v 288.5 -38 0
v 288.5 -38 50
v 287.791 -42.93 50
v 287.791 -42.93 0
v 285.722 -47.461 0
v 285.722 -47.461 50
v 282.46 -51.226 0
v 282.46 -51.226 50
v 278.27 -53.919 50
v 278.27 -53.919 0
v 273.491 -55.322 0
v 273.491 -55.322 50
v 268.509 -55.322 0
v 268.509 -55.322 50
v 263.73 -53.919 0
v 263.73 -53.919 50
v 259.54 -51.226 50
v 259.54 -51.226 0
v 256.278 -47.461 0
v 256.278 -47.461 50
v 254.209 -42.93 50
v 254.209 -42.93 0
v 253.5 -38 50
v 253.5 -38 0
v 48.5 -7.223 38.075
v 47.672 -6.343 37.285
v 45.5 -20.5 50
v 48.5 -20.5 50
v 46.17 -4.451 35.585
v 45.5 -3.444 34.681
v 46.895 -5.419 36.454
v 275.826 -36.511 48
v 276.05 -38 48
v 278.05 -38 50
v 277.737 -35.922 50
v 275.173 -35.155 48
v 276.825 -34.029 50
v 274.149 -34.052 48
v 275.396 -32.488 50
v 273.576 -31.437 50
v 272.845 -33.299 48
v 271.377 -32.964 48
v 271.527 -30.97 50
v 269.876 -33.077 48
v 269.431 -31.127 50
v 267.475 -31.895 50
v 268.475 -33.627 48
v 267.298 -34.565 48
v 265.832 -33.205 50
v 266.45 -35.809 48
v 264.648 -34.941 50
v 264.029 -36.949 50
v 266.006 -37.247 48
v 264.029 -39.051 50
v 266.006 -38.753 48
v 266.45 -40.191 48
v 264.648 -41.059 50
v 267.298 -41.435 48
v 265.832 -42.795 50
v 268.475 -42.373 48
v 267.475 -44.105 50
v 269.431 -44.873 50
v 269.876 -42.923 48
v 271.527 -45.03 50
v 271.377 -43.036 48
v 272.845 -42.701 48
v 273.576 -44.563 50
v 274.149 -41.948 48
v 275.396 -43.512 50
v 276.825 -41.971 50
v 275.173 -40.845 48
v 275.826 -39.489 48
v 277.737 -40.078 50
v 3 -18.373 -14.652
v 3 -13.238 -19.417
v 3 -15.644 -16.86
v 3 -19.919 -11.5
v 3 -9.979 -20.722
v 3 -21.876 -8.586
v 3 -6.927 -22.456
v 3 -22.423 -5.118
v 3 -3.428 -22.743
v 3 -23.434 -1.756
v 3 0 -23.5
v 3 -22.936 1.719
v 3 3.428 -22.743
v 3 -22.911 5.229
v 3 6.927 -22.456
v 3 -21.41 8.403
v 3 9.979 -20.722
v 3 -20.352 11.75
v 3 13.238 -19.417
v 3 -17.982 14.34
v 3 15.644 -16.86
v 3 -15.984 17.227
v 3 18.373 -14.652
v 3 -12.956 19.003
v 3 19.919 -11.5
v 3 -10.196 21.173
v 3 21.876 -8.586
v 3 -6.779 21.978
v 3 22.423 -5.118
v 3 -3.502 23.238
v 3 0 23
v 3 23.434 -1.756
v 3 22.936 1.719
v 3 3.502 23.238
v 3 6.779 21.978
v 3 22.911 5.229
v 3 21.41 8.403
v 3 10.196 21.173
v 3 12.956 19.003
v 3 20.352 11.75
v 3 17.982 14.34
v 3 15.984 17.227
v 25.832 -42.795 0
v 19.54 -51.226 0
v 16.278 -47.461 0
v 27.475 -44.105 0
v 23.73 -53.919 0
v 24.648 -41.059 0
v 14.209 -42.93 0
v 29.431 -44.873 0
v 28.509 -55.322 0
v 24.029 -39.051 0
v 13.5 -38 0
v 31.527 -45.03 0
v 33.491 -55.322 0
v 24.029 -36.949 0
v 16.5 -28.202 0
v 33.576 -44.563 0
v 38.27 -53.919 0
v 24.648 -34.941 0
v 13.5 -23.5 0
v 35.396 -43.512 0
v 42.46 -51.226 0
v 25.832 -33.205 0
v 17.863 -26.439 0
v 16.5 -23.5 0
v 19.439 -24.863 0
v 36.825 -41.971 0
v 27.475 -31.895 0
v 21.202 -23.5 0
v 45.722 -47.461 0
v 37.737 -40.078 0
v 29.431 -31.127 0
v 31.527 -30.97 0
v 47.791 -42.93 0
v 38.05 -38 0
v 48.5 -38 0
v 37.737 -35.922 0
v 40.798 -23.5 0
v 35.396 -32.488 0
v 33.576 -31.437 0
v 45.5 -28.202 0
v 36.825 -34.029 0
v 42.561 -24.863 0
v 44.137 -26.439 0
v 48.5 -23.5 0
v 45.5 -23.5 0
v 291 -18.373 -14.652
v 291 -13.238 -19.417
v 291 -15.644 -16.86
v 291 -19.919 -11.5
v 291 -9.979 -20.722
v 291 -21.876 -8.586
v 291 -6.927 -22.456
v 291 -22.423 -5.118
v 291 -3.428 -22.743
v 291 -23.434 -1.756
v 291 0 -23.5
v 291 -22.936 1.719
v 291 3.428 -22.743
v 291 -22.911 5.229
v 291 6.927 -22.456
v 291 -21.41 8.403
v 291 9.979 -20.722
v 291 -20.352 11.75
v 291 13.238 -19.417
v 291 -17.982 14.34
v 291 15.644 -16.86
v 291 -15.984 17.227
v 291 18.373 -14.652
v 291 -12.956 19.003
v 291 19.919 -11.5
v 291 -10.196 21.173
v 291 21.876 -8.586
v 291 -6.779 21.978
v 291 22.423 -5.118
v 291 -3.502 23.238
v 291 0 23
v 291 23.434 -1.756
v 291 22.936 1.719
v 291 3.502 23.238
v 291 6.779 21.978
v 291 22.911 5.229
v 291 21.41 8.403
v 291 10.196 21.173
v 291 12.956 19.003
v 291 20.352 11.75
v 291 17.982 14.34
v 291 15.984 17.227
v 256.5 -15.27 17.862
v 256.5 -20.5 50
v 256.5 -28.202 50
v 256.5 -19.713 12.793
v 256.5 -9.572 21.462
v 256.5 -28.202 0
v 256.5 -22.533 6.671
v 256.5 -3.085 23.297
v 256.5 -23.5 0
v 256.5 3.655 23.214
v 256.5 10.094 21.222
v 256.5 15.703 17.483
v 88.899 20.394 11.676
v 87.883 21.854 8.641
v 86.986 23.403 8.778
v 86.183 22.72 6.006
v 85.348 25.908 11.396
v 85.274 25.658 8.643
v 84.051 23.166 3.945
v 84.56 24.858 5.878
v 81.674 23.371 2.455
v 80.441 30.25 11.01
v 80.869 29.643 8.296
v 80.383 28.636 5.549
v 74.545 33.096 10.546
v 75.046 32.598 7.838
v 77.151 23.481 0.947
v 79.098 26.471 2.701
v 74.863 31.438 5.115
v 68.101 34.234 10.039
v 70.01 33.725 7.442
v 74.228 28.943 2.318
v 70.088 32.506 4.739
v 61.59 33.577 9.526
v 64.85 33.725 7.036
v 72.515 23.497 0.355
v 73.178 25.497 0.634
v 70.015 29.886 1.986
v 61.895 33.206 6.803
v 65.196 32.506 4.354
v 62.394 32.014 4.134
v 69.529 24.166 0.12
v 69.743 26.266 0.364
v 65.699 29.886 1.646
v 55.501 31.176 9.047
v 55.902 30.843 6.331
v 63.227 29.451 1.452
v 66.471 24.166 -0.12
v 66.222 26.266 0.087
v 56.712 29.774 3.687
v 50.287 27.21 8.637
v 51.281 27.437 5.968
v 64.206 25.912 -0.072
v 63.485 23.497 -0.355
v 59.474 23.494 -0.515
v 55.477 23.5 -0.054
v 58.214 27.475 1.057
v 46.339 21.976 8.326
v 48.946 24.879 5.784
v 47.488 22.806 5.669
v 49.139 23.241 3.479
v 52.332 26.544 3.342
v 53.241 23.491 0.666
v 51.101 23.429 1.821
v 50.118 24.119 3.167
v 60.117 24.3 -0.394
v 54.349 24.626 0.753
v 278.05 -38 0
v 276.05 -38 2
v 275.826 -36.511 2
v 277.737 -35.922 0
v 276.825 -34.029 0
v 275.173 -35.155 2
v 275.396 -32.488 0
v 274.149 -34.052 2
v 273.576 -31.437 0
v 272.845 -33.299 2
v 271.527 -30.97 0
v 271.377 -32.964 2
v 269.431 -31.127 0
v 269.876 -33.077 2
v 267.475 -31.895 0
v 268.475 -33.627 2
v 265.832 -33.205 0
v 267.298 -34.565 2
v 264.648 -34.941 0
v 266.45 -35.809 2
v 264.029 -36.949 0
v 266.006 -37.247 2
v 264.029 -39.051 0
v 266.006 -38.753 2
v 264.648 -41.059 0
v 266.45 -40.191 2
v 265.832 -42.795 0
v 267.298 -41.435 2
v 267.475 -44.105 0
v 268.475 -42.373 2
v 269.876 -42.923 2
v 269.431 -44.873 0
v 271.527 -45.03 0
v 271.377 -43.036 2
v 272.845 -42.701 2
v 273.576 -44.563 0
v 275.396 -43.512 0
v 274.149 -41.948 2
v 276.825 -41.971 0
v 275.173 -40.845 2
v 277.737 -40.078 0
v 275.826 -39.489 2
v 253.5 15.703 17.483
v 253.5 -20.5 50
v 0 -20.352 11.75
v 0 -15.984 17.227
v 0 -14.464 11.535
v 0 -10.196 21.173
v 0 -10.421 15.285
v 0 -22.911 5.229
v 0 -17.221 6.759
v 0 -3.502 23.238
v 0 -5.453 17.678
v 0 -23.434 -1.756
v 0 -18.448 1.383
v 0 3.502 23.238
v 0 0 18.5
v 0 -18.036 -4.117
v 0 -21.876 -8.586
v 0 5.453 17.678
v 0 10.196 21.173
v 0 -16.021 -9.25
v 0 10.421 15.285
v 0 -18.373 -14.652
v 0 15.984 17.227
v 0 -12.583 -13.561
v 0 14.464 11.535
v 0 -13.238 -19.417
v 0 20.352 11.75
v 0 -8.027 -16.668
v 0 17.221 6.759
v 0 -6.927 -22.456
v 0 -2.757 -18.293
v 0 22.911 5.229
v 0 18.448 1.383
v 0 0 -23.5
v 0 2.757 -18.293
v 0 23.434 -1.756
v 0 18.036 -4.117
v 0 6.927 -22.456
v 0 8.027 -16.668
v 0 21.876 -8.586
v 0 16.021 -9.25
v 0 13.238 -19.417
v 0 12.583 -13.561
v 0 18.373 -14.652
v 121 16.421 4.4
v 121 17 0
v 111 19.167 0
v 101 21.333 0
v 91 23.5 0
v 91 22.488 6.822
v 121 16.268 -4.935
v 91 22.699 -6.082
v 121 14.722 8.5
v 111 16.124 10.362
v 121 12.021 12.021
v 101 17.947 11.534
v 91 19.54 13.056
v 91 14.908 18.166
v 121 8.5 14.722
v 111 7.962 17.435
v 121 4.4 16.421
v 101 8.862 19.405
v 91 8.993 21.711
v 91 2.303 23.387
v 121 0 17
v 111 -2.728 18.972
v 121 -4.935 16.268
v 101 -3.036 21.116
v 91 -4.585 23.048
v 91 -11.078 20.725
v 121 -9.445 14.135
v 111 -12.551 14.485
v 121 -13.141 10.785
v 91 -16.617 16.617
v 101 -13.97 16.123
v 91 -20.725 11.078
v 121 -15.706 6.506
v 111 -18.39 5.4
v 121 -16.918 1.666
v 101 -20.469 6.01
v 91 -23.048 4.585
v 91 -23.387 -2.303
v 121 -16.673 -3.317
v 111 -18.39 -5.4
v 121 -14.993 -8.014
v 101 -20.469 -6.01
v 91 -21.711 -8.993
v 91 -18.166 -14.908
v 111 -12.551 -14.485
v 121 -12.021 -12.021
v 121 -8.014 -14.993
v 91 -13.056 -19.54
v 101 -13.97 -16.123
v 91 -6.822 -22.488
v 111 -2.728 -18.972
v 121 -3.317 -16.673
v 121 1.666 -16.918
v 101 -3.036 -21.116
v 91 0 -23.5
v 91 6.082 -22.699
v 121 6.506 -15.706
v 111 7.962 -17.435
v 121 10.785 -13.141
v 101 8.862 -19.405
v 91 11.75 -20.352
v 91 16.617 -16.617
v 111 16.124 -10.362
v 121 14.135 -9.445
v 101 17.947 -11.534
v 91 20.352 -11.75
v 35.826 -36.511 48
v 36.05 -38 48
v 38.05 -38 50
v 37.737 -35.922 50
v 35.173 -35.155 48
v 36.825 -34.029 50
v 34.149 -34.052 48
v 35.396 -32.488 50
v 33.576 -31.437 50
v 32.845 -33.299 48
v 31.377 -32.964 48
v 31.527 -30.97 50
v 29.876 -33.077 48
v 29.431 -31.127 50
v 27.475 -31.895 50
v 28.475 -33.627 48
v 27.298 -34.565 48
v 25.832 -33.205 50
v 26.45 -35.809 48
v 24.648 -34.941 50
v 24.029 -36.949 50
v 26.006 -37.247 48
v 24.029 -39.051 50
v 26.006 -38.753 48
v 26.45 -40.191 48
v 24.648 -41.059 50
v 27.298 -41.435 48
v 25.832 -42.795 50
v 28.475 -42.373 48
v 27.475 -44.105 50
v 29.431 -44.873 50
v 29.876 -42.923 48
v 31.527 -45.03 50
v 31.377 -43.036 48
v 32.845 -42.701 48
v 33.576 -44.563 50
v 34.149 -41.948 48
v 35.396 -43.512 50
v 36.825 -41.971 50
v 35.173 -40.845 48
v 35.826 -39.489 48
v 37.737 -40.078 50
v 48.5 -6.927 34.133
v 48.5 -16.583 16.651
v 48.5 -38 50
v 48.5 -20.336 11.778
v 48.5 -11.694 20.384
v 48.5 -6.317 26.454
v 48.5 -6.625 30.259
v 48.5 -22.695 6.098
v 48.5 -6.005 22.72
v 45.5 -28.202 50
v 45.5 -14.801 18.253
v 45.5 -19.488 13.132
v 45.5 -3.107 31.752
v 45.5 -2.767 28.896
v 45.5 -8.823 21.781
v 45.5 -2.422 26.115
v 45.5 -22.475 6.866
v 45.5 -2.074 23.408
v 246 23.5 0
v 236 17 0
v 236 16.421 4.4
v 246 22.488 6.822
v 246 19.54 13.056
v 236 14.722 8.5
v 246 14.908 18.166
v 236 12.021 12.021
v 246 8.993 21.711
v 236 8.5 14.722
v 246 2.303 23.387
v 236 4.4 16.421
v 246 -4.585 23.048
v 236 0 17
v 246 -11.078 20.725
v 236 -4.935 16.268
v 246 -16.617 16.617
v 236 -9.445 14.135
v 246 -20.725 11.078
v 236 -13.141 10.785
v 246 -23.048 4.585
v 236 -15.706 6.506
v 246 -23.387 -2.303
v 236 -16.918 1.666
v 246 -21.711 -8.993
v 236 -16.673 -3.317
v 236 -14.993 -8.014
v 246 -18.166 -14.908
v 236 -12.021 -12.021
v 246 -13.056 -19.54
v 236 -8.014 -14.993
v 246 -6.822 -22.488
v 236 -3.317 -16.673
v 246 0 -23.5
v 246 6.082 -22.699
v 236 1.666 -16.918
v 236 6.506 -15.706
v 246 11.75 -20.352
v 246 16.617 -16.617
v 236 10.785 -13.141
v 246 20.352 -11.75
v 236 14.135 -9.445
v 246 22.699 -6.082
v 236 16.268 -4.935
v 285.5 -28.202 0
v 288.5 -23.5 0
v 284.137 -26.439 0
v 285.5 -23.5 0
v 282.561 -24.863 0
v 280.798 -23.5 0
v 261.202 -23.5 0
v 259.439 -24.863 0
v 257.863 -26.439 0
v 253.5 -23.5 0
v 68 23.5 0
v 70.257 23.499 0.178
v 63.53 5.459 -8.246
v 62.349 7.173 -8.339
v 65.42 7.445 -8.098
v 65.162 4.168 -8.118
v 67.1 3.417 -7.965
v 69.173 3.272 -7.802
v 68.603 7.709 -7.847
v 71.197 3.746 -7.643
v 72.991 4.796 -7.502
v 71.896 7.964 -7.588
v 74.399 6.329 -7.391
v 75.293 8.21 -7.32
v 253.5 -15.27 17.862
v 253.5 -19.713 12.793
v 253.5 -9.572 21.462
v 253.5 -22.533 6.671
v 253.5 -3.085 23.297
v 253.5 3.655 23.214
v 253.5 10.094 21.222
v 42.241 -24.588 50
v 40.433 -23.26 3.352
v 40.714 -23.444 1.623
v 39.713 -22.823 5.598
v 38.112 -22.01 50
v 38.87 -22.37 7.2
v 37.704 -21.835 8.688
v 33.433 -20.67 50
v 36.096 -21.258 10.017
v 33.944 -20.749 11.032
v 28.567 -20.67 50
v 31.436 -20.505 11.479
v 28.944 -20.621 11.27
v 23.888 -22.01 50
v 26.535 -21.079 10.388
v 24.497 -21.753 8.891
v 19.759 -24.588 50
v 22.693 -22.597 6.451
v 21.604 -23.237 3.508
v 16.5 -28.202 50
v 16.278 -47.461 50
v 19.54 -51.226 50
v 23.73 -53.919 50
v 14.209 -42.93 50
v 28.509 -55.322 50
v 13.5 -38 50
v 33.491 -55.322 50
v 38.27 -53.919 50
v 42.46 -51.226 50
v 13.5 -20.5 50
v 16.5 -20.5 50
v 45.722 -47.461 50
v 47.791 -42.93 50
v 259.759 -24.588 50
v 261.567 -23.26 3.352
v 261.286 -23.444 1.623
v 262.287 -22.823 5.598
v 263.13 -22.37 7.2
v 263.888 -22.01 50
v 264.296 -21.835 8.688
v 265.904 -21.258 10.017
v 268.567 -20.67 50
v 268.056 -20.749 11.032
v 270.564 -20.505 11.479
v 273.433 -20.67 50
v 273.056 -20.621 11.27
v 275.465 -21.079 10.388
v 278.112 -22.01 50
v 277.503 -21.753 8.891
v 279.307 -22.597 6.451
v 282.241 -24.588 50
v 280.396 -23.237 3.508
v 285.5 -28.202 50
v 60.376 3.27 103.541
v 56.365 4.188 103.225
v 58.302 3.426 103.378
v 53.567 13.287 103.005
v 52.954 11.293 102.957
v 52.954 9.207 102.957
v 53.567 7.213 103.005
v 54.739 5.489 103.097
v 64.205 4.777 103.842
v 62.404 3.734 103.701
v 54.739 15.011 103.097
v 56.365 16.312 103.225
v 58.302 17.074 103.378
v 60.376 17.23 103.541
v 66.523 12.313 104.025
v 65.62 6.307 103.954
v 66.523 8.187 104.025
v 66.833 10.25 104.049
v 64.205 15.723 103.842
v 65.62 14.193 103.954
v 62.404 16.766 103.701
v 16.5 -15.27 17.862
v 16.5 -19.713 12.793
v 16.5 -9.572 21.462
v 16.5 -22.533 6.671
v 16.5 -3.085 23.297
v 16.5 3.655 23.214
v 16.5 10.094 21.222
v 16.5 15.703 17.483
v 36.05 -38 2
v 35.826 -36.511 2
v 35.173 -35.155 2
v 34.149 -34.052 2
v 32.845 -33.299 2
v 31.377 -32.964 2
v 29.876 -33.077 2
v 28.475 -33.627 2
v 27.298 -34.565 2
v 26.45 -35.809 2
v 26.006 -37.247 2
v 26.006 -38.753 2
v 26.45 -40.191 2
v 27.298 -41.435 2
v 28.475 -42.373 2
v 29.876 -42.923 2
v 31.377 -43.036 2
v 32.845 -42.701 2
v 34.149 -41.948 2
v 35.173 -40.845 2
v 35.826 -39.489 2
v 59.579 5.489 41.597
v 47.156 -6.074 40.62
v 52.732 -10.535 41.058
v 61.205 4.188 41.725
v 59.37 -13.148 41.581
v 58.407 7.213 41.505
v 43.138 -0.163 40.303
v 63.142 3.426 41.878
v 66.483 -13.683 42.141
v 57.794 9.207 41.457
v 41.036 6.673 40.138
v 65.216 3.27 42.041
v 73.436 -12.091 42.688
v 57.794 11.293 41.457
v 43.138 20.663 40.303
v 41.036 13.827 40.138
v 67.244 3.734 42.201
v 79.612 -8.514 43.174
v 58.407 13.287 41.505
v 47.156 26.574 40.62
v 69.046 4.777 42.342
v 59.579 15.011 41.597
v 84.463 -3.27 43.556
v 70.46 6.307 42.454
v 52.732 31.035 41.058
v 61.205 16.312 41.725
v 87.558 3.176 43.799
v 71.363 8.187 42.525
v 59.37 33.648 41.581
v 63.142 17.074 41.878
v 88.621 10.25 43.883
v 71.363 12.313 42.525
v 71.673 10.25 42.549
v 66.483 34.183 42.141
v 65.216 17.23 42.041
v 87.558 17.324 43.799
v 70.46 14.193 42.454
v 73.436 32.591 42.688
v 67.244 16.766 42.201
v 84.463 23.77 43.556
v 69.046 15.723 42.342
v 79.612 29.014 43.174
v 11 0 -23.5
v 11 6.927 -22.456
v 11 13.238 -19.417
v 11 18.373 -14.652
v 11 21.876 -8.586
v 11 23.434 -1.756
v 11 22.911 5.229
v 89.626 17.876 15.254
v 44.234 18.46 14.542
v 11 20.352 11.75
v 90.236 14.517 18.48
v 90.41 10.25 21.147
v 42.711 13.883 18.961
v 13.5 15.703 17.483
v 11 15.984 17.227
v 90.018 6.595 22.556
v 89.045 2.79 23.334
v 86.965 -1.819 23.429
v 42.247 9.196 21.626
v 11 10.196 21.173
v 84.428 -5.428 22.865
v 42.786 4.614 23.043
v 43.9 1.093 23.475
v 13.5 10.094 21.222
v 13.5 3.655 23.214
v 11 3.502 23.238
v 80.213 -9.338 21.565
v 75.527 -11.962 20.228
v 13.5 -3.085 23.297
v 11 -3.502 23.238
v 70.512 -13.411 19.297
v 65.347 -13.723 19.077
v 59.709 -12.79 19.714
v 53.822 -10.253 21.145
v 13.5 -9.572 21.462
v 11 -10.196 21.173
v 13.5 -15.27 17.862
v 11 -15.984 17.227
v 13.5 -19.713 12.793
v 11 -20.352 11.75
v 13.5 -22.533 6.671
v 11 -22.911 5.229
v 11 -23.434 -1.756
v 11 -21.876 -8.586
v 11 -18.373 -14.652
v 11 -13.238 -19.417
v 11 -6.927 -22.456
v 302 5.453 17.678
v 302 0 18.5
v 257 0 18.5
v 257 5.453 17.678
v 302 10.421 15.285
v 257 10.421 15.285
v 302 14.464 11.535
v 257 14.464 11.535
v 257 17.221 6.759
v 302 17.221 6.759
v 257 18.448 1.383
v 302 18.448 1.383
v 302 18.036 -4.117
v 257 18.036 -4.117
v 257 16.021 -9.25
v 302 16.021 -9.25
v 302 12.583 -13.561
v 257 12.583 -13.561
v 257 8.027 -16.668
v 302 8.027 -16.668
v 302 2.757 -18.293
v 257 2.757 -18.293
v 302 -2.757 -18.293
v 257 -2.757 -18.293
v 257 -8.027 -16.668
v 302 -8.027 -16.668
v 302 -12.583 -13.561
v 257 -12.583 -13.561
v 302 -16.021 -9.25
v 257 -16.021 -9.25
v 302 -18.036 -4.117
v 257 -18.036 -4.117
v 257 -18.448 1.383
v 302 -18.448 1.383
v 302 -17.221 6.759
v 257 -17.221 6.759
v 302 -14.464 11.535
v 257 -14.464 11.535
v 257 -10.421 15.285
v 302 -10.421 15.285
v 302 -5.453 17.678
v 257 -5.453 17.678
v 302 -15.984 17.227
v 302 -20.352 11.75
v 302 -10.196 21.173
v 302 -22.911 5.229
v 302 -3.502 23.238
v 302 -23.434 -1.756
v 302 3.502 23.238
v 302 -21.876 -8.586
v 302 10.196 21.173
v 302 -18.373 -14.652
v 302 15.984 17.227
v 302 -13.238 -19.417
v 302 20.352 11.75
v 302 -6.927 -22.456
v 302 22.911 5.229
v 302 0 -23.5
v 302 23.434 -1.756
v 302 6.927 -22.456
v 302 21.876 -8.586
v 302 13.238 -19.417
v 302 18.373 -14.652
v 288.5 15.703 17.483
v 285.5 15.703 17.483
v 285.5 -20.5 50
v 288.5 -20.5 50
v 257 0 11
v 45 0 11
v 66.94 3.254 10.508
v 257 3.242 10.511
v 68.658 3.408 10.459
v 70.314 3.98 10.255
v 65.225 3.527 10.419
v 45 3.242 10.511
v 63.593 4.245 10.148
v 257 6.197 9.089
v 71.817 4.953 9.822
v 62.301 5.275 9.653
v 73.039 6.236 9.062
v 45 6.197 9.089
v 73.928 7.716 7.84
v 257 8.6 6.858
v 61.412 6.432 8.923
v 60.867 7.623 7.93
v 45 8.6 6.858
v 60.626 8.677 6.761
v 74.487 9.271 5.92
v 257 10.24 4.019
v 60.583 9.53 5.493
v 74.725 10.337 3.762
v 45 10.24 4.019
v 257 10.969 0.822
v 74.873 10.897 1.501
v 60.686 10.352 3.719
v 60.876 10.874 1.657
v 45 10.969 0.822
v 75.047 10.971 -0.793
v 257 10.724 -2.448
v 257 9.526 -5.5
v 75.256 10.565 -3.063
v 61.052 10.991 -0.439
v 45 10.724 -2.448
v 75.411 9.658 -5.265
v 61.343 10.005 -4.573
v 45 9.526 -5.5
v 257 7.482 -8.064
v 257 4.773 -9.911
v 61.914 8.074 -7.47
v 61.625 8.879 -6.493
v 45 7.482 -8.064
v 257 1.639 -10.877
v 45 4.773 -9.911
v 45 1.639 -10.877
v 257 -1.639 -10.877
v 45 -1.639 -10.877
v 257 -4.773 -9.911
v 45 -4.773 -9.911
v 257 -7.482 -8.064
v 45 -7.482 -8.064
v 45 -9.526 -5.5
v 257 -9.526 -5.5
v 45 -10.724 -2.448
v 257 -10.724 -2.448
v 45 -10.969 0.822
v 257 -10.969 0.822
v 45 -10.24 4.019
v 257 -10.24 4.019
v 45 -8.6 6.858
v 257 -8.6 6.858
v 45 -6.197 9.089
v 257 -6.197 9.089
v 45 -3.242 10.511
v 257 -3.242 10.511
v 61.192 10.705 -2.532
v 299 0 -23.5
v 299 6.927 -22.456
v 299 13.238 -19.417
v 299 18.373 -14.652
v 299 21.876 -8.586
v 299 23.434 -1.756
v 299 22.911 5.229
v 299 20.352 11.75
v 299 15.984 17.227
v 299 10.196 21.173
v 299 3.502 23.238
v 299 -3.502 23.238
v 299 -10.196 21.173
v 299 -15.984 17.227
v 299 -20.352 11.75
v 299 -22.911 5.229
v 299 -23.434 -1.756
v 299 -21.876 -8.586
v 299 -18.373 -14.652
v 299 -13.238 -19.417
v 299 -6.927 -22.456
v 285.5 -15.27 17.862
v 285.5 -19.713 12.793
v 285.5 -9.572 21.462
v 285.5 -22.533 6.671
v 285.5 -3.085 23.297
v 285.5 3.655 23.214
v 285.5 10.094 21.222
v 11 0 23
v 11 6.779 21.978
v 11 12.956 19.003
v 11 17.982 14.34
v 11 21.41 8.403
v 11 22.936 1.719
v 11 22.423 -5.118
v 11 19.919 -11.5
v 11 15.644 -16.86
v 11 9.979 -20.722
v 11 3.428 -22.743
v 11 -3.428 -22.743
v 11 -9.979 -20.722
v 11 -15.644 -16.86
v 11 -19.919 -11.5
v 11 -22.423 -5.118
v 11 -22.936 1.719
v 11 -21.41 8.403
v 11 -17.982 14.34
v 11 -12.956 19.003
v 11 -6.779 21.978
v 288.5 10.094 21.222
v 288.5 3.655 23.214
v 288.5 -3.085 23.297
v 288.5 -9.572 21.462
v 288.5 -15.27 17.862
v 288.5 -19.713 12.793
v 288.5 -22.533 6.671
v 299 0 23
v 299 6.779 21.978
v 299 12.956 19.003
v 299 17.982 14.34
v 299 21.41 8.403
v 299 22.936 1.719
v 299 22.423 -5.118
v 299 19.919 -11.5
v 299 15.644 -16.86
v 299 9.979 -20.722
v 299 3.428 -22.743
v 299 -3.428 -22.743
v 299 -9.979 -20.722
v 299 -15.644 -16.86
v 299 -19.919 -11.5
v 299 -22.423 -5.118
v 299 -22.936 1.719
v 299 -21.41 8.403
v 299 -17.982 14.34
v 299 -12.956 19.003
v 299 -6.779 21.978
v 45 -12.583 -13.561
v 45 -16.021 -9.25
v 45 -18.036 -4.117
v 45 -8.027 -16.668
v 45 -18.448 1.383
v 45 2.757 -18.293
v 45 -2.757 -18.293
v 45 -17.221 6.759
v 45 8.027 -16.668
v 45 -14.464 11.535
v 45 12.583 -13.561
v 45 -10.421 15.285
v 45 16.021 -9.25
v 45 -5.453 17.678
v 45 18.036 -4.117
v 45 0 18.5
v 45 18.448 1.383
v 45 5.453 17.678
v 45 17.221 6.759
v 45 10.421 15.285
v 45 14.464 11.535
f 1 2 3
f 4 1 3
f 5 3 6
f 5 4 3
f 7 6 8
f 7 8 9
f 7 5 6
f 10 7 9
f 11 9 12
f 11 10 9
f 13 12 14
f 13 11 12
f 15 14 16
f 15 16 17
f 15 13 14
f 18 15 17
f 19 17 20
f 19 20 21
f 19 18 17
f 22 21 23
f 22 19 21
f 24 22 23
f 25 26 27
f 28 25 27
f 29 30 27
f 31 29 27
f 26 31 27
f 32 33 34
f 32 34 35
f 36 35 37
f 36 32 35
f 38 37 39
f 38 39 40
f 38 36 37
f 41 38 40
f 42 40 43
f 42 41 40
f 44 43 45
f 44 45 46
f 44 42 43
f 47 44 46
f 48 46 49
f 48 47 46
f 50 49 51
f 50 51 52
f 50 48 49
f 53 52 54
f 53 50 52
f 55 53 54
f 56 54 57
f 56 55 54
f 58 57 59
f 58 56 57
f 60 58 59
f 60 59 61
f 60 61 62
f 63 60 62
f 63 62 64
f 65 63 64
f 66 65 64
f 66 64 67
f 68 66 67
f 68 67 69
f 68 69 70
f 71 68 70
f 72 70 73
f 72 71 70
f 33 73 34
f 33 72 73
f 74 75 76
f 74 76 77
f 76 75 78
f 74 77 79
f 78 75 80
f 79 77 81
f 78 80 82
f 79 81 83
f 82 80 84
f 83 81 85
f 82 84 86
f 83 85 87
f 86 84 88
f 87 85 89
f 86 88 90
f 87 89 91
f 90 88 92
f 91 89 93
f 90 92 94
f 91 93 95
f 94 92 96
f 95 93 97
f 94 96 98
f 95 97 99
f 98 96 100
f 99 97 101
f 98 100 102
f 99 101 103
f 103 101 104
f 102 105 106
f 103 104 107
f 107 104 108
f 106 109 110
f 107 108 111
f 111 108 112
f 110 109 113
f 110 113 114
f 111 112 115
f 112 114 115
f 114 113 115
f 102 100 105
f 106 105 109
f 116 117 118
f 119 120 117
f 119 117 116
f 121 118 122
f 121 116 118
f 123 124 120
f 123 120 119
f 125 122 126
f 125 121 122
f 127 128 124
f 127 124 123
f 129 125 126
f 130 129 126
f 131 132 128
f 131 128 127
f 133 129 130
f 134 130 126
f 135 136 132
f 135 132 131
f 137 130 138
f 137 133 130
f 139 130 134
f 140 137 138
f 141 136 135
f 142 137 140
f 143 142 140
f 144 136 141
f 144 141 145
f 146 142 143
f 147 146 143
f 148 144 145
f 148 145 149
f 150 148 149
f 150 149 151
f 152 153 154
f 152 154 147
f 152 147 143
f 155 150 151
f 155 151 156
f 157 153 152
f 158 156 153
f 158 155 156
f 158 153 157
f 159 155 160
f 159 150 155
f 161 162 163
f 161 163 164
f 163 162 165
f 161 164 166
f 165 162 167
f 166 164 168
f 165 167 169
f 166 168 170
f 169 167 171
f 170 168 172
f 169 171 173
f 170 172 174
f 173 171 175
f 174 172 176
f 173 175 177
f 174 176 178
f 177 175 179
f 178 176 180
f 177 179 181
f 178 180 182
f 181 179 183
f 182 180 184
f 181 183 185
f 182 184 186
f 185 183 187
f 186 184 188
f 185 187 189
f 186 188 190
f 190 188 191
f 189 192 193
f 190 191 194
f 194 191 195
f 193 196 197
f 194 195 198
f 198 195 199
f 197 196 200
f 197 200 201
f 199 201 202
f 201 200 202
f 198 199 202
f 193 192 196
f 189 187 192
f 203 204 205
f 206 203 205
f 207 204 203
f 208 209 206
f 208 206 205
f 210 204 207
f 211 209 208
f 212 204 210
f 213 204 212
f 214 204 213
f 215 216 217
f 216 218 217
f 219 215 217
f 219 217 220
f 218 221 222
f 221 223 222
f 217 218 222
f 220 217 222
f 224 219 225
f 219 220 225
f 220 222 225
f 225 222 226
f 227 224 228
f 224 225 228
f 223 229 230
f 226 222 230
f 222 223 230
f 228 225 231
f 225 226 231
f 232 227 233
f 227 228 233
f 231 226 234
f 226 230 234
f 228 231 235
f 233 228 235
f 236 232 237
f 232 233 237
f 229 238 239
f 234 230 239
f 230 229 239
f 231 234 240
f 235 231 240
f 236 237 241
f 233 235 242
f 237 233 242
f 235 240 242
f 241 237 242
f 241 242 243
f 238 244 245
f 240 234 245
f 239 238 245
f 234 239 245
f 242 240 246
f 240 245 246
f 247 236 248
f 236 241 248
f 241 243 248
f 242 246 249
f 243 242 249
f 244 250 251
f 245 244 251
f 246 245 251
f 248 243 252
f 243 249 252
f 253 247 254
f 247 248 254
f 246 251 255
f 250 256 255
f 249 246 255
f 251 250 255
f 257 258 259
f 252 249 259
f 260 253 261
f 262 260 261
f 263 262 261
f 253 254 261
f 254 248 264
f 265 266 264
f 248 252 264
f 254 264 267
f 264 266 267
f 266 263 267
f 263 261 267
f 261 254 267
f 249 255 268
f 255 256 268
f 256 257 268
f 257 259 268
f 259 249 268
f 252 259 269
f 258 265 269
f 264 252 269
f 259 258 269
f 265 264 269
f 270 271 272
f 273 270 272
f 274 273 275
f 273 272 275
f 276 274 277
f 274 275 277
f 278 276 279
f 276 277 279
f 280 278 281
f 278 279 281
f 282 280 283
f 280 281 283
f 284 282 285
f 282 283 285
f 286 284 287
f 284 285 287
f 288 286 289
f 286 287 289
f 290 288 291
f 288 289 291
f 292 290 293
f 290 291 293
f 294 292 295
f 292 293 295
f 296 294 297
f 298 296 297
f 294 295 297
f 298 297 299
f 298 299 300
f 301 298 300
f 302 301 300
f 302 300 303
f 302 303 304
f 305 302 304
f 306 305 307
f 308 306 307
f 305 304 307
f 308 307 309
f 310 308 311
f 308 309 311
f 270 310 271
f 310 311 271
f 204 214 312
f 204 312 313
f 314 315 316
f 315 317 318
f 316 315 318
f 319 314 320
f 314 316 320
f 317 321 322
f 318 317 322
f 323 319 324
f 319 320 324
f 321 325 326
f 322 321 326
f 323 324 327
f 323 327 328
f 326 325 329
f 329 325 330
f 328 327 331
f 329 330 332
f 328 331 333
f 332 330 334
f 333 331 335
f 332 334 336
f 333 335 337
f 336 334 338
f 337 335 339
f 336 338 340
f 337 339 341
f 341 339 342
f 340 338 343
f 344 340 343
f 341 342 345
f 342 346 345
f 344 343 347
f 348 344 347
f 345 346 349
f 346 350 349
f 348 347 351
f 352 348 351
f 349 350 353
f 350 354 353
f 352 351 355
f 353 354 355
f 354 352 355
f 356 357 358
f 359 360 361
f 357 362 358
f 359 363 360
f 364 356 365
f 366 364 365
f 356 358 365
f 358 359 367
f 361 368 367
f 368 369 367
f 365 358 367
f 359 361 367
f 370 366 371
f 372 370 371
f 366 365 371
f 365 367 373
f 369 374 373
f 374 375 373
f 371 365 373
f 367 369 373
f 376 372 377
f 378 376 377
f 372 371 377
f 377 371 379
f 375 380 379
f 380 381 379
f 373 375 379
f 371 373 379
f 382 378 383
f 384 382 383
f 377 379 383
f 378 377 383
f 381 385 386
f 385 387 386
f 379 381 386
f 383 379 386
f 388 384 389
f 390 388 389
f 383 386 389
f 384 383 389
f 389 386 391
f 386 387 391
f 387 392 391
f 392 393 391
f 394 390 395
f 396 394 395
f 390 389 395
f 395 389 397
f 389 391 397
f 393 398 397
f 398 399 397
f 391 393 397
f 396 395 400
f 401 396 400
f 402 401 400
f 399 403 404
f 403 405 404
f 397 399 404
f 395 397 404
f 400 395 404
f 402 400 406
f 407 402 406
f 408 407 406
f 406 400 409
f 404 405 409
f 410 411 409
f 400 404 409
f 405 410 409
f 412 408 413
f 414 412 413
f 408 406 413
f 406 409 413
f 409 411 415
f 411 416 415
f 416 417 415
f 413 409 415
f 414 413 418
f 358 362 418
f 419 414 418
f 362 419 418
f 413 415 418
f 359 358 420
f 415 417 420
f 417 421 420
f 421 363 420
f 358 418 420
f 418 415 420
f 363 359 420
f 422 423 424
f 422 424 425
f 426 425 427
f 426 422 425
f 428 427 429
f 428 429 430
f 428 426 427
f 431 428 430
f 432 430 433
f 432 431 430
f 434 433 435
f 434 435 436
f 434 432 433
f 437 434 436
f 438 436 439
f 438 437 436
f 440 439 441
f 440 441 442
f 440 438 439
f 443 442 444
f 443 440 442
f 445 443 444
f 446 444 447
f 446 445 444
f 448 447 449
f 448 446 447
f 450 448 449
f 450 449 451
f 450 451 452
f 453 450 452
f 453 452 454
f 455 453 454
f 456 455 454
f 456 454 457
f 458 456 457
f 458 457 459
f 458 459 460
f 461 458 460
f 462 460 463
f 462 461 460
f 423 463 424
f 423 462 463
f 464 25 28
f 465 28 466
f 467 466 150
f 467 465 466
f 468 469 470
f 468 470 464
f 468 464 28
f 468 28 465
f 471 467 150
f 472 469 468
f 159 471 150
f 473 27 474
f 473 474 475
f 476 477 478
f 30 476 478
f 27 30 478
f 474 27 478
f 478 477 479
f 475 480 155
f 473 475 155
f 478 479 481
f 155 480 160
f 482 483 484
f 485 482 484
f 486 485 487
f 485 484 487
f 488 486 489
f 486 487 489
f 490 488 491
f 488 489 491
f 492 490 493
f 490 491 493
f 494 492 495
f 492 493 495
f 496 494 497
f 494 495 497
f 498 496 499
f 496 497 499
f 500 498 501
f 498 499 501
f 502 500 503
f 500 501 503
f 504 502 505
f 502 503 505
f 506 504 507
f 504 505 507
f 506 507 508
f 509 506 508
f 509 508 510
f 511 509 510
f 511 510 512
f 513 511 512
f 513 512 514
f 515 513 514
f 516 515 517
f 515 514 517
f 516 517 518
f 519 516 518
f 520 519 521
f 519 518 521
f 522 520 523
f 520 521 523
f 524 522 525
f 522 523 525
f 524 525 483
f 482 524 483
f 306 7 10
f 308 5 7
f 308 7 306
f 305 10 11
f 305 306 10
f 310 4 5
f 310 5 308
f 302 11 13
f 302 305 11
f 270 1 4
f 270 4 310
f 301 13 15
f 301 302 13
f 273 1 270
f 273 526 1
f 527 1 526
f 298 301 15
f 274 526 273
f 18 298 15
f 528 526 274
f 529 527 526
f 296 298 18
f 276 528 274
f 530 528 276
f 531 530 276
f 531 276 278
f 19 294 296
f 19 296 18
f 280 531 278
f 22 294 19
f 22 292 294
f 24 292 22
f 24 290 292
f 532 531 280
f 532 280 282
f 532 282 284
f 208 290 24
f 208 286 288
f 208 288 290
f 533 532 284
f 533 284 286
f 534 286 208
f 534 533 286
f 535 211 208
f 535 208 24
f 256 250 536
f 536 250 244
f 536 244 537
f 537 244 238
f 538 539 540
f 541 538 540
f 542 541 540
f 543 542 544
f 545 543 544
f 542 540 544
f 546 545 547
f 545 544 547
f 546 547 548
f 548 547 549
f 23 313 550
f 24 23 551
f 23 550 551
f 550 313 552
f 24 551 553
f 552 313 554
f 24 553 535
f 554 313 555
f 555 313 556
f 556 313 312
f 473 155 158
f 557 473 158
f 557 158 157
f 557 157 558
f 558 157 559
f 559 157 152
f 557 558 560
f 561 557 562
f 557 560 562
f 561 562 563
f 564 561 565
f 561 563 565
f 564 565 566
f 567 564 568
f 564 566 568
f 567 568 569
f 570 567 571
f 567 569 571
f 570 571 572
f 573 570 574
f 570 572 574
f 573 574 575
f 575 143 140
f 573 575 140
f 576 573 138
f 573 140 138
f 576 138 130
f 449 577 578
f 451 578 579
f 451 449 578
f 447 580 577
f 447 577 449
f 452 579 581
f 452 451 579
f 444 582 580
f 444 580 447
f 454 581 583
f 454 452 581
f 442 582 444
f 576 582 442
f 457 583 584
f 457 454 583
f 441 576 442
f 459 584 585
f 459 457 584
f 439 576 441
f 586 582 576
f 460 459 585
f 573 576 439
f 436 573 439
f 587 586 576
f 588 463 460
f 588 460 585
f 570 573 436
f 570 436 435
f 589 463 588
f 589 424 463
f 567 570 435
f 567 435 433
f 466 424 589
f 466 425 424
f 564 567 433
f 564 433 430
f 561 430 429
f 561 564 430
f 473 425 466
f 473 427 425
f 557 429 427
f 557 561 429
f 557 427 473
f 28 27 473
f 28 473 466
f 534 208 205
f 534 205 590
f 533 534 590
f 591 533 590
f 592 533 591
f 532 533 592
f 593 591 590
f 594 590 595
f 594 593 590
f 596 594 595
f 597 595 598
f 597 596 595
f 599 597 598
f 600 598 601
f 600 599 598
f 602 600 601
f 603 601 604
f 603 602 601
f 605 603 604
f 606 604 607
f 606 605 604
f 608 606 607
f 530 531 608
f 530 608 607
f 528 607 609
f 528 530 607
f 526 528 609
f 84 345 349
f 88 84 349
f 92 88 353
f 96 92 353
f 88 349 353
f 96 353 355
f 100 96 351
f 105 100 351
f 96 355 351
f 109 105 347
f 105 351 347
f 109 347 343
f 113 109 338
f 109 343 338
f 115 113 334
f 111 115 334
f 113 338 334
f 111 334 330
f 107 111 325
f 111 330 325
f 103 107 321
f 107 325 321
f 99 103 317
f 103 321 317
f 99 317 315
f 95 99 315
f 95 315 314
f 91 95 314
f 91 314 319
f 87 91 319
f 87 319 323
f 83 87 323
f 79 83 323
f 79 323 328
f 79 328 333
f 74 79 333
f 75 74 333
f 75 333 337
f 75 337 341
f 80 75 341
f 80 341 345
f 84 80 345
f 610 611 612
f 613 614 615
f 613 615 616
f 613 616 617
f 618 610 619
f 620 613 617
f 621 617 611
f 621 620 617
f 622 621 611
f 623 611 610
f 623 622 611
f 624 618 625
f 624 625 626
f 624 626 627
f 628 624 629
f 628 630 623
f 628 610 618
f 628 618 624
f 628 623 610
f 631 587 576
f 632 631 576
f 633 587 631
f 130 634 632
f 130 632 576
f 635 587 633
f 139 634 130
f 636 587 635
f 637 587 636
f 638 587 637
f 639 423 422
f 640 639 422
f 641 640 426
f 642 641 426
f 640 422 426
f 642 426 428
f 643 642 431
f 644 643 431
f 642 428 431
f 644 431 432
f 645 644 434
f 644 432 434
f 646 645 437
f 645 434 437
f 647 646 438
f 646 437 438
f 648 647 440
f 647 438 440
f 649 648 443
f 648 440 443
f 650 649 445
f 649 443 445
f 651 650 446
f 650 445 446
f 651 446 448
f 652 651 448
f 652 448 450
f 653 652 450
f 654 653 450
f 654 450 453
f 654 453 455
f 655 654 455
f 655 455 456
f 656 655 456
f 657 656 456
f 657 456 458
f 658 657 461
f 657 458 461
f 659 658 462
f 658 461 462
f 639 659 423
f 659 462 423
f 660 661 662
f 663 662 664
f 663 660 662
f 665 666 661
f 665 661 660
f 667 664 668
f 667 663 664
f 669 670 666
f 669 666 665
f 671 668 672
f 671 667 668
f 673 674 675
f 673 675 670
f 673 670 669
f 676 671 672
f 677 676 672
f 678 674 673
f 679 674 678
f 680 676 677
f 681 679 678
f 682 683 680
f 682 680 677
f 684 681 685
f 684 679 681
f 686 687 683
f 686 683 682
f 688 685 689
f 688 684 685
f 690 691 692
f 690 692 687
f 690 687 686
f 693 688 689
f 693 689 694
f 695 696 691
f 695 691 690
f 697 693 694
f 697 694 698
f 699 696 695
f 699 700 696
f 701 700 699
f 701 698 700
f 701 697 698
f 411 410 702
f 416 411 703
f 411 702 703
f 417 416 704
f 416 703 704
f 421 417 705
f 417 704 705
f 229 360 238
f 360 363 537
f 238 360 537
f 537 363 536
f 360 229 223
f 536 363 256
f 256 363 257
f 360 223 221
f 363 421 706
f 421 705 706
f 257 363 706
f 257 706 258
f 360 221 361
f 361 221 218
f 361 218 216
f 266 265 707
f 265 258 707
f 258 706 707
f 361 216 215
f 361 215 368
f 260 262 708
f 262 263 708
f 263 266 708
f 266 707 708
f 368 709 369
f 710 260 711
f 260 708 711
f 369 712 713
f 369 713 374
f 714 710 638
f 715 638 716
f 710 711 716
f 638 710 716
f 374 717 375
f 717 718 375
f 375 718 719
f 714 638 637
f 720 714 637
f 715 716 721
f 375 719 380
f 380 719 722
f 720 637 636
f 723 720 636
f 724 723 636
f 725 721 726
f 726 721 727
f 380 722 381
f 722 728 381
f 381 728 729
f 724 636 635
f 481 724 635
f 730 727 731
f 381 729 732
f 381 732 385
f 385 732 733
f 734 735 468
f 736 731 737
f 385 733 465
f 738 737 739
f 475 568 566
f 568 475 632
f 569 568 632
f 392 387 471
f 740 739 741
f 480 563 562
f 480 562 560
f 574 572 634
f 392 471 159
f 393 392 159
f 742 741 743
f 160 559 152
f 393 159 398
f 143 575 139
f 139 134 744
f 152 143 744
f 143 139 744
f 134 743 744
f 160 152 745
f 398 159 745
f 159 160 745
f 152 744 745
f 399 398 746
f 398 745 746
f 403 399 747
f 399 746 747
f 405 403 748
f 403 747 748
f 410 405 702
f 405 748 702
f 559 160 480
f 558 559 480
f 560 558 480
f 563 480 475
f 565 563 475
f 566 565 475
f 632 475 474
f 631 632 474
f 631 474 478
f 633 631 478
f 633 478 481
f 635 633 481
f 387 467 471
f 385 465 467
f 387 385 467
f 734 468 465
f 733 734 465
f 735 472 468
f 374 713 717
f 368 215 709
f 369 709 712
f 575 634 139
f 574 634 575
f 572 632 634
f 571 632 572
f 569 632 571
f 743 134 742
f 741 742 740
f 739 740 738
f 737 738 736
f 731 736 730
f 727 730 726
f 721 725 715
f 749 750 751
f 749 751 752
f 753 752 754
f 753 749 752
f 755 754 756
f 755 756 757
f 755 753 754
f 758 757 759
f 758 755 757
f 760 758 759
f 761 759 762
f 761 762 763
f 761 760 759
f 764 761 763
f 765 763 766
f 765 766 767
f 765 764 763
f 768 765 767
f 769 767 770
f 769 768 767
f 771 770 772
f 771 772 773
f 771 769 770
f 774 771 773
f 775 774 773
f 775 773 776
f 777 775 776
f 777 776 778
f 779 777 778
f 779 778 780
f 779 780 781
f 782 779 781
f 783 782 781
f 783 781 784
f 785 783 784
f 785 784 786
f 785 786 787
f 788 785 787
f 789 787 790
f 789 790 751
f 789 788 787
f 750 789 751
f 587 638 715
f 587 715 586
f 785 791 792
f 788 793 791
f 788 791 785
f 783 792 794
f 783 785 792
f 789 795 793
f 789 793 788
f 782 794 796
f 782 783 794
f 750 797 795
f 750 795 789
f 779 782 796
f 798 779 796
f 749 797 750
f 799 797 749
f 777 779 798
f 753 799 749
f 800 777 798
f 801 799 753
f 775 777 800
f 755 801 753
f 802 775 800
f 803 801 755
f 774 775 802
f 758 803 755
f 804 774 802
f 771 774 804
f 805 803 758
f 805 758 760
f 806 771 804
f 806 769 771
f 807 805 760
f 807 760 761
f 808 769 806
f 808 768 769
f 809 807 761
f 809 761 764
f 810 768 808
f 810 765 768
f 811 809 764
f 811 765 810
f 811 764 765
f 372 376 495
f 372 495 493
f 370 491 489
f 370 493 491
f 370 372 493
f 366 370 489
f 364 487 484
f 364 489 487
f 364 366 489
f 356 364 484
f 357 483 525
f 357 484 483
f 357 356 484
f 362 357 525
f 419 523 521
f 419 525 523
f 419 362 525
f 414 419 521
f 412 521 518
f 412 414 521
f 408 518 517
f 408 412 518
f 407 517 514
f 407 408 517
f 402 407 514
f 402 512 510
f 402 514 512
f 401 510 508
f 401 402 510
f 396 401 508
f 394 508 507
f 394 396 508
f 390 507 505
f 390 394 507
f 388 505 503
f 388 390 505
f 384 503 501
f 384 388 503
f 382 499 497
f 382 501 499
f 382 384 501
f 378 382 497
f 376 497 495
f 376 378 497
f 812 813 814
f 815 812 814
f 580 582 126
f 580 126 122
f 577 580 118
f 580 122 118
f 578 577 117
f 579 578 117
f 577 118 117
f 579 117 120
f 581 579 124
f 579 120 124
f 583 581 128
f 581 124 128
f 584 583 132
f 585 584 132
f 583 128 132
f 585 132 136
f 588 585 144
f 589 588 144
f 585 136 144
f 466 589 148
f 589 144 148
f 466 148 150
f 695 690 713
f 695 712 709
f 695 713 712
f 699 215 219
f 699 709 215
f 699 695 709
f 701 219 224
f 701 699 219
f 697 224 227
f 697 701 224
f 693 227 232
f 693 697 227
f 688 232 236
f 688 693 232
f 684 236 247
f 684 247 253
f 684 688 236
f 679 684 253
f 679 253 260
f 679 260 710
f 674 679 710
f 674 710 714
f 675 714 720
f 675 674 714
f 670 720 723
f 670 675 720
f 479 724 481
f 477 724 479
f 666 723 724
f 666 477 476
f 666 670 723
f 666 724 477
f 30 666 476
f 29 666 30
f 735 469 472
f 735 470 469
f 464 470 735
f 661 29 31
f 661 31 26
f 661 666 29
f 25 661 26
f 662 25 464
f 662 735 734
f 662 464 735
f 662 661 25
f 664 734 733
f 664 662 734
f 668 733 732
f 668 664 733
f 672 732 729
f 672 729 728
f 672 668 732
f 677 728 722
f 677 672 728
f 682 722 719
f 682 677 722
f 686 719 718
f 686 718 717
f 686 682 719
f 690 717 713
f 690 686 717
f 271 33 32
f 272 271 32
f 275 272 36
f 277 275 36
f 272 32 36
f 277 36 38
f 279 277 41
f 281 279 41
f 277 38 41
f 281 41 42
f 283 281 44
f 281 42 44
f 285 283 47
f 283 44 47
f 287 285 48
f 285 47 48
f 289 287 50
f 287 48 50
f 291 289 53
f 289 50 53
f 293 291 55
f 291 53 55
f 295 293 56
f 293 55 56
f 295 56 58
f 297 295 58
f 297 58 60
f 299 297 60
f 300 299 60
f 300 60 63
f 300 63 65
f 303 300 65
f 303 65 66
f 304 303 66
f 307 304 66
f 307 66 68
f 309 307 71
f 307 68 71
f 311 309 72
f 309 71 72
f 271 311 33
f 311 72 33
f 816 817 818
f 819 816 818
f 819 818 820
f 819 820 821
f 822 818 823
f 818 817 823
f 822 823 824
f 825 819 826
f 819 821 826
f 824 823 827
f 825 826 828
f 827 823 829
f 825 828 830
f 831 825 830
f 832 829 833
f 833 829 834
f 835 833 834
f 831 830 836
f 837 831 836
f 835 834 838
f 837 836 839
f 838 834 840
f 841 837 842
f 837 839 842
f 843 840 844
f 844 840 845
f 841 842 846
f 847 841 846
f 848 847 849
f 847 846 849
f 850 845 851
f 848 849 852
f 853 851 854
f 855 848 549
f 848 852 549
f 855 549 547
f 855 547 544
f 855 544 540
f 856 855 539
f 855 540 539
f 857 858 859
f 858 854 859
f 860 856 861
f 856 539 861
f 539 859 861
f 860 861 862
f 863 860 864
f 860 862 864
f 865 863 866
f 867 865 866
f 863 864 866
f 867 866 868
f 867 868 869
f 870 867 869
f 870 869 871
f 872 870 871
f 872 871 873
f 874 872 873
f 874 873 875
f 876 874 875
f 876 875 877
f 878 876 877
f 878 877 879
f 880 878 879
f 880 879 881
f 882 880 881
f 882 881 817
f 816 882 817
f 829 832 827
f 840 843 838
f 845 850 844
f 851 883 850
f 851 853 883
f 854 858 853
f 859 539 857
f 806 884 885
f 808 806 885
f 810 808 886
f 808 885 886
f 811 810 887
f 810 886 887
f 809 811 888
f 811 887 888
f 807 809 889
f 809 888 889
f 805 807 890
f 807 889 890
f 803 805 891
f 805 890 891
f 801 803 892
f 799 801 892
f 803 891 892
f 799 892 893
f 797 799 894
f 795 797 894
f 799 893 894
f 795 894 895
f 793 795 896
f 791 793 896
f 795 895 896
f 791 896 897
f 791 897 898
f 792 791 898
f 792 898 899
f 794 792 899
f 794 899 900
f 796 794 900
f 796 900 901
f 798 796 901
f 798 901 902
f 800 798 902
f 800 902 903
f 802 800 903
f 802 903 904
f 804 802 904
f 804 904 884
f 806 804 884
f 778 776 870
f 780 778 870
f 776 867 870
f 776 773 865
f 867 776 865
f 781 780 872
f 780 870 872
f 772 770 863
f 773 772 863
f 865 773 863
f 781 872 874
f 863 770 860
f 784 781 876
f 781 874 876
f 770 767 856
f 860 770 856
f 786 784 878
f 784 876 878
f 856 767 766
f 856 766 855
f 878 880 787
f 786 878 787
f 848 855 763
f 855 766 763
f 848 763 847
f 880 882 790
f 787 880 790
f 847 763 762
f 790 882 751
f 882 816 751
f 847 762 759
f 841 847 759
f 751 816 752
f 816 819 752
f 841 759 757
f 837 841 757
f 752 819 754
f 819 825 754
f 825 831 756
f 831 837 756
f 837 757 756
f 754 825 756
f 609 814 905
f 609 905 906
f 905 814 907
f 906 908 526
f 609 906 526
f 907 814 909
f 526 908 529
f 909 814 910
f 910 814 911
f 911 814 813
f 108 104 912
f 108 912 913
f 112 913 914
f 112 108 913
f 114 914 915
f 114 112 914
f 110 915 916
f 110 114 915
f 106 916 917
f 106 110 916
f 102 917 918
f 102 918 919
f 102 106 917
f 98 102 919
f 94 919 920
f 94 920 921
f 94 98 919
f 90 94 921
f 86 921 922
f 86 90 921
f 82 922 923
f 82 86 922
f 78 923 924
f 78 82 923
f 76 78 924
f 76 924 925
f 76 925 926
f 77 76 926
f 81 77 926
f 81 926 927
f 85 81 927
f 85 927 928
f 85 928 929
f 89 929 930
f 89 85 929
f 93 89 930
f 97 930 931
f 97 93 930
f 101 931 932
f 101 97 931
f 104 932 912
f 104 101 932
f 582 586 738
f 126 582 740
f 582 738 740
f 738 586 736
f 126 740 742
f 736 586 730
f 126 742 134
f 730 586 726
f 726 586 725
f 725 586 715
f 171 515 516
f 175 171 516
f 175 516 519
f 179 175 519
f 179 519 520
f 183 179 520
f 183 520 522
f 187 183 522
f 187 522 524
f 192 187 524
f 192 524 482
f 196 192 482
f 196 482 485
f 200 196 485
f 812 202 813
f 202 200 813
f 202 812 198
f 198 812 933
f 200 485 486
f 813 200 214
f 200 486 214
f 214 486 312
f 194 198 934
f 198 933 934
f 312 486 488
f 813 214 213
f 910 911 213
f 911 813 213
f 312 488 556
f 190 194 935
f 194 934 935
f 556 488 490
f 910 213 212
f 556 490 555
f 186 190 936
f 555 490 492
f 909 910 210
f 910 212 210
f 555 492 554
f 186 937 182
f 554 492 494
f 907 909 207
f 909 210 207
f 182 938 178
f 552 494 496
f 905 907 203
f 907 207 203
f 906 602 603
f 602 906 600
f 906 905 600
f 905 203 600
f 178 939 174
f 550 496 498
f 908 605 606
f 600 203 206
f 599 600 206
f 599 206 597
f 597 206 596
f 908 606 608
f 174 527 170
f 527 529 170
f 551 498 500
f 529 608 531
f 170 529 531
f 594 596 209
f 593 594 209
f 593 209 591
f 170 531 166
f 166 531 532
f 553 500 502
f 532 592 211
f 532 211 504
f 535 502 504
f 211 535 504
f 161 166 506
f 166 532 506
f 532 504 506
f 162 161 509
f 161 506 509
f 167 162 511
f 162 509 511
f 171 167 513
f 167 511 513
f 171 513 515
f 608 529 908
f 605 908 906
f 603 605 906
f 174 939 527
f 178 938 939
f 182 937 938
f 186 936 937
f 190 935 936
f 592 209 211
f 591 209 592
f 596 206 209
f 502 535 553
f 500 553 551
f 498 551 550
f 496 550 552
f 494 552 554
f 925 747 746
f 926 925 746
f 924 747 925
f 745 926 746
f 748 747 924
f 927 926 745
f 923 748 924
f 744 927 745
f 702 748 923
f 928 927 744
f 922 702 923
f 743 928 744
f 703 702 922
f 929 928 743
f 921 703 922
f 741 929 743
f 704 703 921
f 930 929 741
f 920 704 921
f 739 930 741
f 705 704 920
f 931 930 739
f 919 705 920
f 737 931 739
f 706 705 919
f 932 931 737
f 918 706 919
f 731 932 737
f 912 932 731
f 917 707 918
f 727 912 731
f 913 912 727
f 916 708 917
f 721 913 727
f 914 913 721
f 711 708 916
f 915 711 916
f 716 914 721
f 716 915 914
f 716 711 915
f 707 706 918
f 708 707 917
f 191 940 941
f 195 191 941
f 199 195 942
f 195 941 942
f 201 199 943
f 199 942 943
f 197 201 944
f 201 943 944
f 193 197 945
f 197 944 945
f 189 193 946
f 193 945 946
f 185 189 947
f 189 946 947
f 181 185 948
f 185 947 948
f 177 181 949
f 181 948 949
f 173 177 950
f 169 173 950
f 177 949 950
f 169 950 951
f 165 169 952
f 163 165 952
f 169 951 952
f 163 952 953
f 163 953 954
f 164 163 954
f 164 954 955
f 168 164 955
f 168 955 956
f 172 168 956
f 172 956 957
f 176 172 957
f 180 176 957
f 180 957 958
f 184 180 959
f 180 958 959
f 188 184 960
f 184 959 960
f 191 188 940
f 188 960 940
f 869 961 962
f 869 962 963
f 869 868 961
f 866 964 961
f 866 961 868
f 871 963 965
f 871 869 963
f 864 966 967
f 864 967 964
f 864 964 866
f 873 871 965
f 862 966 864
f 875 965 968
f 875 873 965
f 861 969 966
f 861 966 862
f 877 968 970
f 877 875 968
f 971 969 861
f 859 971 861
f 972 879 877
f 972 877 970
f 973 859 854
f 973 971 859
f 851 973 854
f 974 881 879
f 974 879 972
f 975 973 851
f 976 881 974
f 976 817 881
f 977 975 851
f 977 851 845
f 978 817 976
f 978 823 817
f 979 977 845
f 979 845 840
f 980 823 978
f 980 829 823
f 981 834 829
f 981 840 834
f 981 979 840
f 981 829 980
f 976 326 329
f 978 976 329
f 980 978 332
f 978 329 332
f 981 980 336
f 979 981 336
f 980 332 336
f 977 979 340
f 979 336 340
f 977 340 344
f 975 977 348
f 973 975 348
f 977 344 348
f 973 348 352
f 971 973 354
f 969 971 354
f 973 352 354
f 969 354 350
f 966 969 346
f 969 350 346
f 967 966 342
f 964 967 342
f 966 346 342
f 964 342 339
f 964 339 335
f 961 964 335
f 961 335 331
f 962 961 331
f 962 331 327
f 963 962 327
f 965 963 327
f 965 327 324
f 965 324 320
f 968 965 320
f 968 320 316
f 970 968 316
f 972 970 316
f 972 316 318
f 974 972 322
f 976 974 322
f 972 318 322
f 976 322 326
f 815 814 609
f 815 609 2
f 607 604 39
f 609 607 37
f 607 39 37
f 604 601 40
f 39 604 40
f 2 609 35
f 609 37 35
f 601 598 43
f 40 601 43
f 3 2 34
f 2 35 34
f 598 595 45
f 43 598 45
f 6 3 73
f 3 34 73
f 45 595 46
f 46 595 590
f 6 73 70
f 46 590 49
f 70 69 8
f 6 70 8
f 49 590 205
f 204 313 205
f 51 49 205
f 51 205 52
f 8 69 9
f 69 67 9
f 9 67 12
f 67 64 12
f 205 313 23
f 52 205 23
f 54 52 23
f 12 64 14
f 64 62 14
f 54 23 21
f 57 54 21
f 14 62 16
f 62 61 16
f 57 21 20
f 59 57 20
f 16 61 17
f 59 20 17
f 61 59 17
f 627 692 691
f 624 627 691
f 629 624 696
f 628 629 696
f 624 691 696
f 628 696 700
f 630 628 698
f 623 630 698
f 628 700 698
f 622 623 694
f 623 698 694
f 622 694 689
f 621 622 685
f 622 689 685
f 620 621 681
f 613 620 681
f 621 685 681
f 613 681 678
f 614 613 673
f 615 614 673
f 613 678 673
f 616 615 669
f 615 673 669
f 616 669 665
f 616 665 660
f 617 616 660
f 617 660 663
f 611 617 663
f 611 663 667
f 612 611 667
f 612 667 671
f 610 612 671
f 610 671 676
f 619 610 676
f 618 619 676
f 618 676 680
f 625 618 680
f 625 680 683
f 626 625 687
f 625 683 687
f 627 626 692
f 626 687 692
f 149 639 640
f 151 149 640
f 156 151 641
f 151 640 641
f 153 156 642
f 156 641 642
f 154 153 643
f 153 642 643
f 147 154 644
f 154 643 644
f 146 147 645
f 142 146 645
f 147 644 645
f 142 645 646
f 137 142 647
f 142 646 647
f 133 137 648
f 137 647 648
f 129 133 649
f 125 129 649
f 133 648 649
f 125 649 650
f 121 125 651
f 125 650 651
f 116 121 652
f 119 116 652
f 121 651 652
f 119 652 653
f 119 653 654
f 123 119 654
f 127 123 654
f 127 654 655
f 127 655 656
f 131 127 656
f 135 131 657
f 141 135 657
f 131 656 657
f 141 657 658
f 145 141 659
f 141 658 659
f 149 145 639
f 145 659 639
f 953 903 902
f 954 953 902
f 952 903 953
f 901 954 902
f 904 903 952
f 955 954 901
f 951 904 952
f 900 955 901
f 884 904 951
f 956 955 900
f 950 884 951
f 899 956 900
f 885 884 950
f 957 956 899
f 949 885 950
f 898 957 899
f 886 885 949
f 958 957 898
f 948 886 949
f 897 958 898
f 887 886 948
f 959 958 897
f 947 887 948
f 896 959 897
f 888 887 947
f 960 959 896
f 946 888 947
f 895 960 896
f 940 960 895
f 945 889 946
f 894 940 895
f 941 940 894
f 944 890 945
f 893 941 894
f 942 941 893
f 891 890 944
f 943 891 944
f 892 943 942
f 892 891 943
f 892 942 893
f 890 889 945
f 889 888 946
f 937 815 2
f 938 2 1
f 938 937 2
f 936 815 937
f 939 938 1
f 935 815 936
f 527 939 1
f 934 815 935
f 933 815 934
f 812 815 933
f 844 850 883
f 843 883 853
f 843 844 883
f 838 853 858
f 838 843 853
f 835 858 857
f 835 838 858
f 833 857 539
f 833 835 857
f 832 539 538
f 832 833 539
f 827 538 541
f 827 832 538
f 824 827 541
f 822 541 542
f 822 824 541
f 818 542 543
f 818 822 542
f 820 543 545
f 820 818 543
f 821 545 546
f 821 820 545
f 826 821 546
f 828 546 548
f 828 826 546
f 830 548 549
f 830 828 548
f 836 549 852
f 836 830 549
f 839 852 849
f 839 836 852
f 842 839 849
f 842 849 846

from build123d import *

# Parameters (mm, degrees)
SZKIC1_R                        = 23.5
DODANIE_WYCI_GNI_CIE1_DEPTH     = 302
SZKIC2_R                        = 17.5
DODANIE_WYCI_GNI_CIE2_DEPTH     = 50
SZKIC4_R                        = 17.5
DODANIE_WYCI_GNI_CIE3_DEPTH     = 50
SZKIC5_R                        = 5.05
WYTNIJ_WYCI_GNI_CIE1_DEPTH      = 50
SFAZOWANIE1_SIZE                = 2
SZKIC8_R                        = 24
DODANIE_WYCI_GNI_CIE4_DEPTH     = 42.129872
SZKIC12_R                       = 7
DODANIE_WYCI_GNI_CIE5_DEPTH     = 61.69017
SZKIC6_R                        = 11
WYTNIJ_WYCI_GNI_CIE2_DEPTH      = 302
SZKIC13_R                       = 7
DODANIE_WYCI_GNI_CIE6_DEPTH     = 50
DODANIE_WYCI_GNI_CIE7_START     = 14.5
DODANIE_WYCI_GNI_CIE7_DEPTH     = 3
ZAOKR_GLENIE1_R                 = 10
LUSTRO2_START                   = 14.5
LUSTRO2_COPY_1_DEPTH            = 3
WYTNIJ_WYCI_GNI_CIE3_START      = -3
SZKIC17_R                       = 23.5
SZKIC17_R_2                     = 23
WYTNIJ_WYCI_GNI_CIE3_DEPTH      = 8
SZKIC18_R                       = 23.5
SZKIC18_R_2                     = 17
WYTNIJ_WYCI_GNI_CIE4_DEPTH      = 60
WYTNIJ_WYCI_GNI_CIE4_DEPTH_BACK = 95
SZKIC20_R                       = 18.5
WYTNIJ_WYCI_GNI_CIE5_DEPTH      = 45


with BuildPart() as part:
    # Szkic1 → Dodanie-wyciągnięcie1 (new body)
    with BuildSketch(Plane(origin=(0, 0, 0), x_dir=(0, 0, -1), z_dir=(1, 0, 0))):
        Circle(SZKIC1_R)
    extrude(amount=DODANIE_WYCI_GNI_CIE1_DEPTH)

    # Szkic2 → Dodanie-wyciągnięcie2 (add)
    with BuildSketch(Plane.XY):
        with Locations((31, -38)):
            Circle(SZKIC2_R)
    extrude(amount=DODANIE_WYCI_GNI_CIE2_DEPTH)

    # Szkic4 → Dodanie-wyciągnięcie3 (add)
    with BuildSketch(Plane(origin=(0, 0, 0), x_dir=(-1, 0, 0), z_dir=(0, 0, -1))):
        with Locations((-271, -38)):
            Circle(SZKIC4_R)
    extrude(amount=-DODANIE_WYCI_GNI_CIE3_DEPTH)

    # Szkic5 → Wytnij-wyciągnięcie1 (cut)
    with BuildSketch(Plane.XY.offset(50)):
        with Locations((31, -38)):
            Circle(SZKIC5_R)
        with Locations((271, -38)):
            Circle(SZKIC5_R)
    extrude(amount=-WYTNIJ_WYCI_GNI_CIE1_DEPTH, mode=Mode.SUBTRACT)

    # Sfazowanie1
    sfazowanie1_edges = [part.edges().sort_by_distance(p)[0] for p in [
        (25.95, -38, 0),
        (25.95, -38, 50),
        (265.95, -38, 0),
        (265.95, -38, 50),
    ]]
    chamfer(sfazowanie1_edges, length=SFAZOWANIE1_SIZE)

    # Szkic8 → Dodanie-wyciągnięcie4 (add)
    with BuildSketch(Plane(origin=(64.694528313, 23.5, 42), x_dir=(0.996917334, 0, 0.078459096), z_dir=(-0.078459096, 0, 0.996917334))):
        with Locations((0, -13.25)):
            Circle(SZKIC8_R)
    extrude(amount=-DODANIE_WYCI_GNI_CIE4_DEPTH)

    # Szkic12 → Dodanie-wyciągnięcie5 (add)
    with BuildSketch(Plane(origin=(-2.886875267, 0, 36.681228189), x_dir=(0.996917334, 0, 0.078459096), z_dir=(-0.078459096, 0, 0.996917334))):
        with Locations((67.790378694, 10.25)):
            Circle(SZKIC12_R)
    extrude(amount=DODANIE_WYCI_GNI_CIE5_DEPTH)

    # Szkic6 → Wytnij-wyciągnięcie2 (cut)
    with BuildSketch(Plane.ZY):
        Circle(SZKIC6_R)
    extrude(amount=-WYTNIJ_WYCI_GNI_CIE2_DEPTH, mode=Mode.SUBTRACT)

    # Szkic13 → Dodanie-wyciągnięcie6 (add)
    with BuildSketch(Plane(origin=(64.694528313, 23.5, 42), x_dir=(0.996917334, 0, 0.078459096), z_dir=(-0.078459096, 0, 0.996917334))):
        with Locations((0, -13.25)):
            Circle(SZKIC13_R)
    extrude(amount=-DODANIE_WYCI_GNI_CIE6_DEPTH)

    # Szkic16 → Dodanie-wyciągnięcie7 (add)
    with BuildSketch(Plane.ZY.offset(-31).offset(DODANIE_WYCI_GNI_CIE7_START)):
        Polygon((50, -38), (0, -38), (0, -20.172556468), (13.849344331, -17.060101722), (21.580694053, -1.91951259), (17.483252048, 15.703053774), (50, -20.5), align=None)
    dodanie_wyci_gni_cie7 = extrude(amount=DODANIE_WYCI_GNI_CIE7_DEPTH)

    # Zaokrąglenie1
    zaokr_glenie1_edges = [part.edges().sort_by_distance(p)[0] for p in [
        (68.000000001, 34.25, 3.37e-07),
    ]]
    fillet(zaokr_glenie1_edges, radius=ZAOKR_GLENIE1_R)

    # Lustro1: Dodanie-wyciągnięcie7 across plane
    add(dodanie_wyci_gni_cie7.mirror(Plane.ZY.offset(-31)))

    # Lustro2: Dodanie-wyciągnięcie7 across plane
    add(dodanie_wyci_gni_cie7.mirror(Plane.ZY.offset(-151)))

    # Lustro2 copy 1 sketch → Lustro2 copy 1 (add)
    with BuildSketch(Plane.ZY.offset(-271).offset(LUSTRO2_START)):
        Polygon((50, -38), (0, -38), (0, -20.172556468), (13.849344331, -17.060101722), (21.580694053, -1.91951259), (17.483252048, 15.703053774), (50, -20.5), align=None)
    extrude(amount=LUSTRO2_COPY_1_DEPTH)

    # Szkic17 → Wytnij-wyciągnięcie3 (cut)
    with BuildSketch(Plane.ZY.offset(WYTNIJ_WYCI_GNI_CIE3_START)):
        Circle(SZKIC17_R)
        Circle(SZKIC17_R_2, mode=Mode.SUBTRACT)
    wytnij_wyci_gni_cie3 = extrude(amount=-WYTNIJ_WYCI_GNI_CIE3_DEPTH, mode=Mode.SUBTRACT)

    # Lustro3: Wytnij-wyciągnięcie3 across plane
    add(wytnij_wyci_gni_cie3.mirror(Plane.ZY.offset(-151)), mode=Mode.SUBTRACT)

    # Szkic18 → Wytnij-wyciągnięcie4 (cut, two sides)
    with BuildSketch(Plane.ZY.offset(-151)) as wytnij_wyci_gni_cie4_sk:
        Circle(SZKIC18_R)
        Circle(SZKIC18_R_2, mode=Mode.SUBTRACT)
    extrude(amount=WYTNIJ_WYCI_GNI_CIE4_DEPTH, mode=Mode.SUBTRACT)
    extrude(wytnij_wyci_gni_cie4_sk.sketch, amount=-WYTNIJ_WYCI_GNI_CIE4_DEPTH_BACK, mode=Mode.SUBTRACT)

    # Szkic19 → Obrót1 (revolve)
    with BuildSketch(Plane.XY):
        Polygon((91, 23.5), (91, 17), (121, 17), align=None)
        Polygon((246, 17), (246, 23.5), (236, 17), align=None)
    revolve(axis=Axis((0, 0, 0), (1, 0, 0)))

    # Szkic20 → Wytnij-wyciągnięcie5 (cut)
    with BuildSketch(Plane.ZY):
        Circle(SZKIC20_R)
    wytnij_wyci_gni_cie5 = extrude(amount=-WYTNIJ_WYCI_GNI_CIE5_DEPTH, mode=Mode.SUBTRACT)

    # Lustro4: Wytnij-wyciągnięcie5 across plane
    add(wytnij_wyci_gni_cie5.mirror(Plane.ZY.offset(-151)), mode=Mode.SUBTRACT)


solid = part.part
